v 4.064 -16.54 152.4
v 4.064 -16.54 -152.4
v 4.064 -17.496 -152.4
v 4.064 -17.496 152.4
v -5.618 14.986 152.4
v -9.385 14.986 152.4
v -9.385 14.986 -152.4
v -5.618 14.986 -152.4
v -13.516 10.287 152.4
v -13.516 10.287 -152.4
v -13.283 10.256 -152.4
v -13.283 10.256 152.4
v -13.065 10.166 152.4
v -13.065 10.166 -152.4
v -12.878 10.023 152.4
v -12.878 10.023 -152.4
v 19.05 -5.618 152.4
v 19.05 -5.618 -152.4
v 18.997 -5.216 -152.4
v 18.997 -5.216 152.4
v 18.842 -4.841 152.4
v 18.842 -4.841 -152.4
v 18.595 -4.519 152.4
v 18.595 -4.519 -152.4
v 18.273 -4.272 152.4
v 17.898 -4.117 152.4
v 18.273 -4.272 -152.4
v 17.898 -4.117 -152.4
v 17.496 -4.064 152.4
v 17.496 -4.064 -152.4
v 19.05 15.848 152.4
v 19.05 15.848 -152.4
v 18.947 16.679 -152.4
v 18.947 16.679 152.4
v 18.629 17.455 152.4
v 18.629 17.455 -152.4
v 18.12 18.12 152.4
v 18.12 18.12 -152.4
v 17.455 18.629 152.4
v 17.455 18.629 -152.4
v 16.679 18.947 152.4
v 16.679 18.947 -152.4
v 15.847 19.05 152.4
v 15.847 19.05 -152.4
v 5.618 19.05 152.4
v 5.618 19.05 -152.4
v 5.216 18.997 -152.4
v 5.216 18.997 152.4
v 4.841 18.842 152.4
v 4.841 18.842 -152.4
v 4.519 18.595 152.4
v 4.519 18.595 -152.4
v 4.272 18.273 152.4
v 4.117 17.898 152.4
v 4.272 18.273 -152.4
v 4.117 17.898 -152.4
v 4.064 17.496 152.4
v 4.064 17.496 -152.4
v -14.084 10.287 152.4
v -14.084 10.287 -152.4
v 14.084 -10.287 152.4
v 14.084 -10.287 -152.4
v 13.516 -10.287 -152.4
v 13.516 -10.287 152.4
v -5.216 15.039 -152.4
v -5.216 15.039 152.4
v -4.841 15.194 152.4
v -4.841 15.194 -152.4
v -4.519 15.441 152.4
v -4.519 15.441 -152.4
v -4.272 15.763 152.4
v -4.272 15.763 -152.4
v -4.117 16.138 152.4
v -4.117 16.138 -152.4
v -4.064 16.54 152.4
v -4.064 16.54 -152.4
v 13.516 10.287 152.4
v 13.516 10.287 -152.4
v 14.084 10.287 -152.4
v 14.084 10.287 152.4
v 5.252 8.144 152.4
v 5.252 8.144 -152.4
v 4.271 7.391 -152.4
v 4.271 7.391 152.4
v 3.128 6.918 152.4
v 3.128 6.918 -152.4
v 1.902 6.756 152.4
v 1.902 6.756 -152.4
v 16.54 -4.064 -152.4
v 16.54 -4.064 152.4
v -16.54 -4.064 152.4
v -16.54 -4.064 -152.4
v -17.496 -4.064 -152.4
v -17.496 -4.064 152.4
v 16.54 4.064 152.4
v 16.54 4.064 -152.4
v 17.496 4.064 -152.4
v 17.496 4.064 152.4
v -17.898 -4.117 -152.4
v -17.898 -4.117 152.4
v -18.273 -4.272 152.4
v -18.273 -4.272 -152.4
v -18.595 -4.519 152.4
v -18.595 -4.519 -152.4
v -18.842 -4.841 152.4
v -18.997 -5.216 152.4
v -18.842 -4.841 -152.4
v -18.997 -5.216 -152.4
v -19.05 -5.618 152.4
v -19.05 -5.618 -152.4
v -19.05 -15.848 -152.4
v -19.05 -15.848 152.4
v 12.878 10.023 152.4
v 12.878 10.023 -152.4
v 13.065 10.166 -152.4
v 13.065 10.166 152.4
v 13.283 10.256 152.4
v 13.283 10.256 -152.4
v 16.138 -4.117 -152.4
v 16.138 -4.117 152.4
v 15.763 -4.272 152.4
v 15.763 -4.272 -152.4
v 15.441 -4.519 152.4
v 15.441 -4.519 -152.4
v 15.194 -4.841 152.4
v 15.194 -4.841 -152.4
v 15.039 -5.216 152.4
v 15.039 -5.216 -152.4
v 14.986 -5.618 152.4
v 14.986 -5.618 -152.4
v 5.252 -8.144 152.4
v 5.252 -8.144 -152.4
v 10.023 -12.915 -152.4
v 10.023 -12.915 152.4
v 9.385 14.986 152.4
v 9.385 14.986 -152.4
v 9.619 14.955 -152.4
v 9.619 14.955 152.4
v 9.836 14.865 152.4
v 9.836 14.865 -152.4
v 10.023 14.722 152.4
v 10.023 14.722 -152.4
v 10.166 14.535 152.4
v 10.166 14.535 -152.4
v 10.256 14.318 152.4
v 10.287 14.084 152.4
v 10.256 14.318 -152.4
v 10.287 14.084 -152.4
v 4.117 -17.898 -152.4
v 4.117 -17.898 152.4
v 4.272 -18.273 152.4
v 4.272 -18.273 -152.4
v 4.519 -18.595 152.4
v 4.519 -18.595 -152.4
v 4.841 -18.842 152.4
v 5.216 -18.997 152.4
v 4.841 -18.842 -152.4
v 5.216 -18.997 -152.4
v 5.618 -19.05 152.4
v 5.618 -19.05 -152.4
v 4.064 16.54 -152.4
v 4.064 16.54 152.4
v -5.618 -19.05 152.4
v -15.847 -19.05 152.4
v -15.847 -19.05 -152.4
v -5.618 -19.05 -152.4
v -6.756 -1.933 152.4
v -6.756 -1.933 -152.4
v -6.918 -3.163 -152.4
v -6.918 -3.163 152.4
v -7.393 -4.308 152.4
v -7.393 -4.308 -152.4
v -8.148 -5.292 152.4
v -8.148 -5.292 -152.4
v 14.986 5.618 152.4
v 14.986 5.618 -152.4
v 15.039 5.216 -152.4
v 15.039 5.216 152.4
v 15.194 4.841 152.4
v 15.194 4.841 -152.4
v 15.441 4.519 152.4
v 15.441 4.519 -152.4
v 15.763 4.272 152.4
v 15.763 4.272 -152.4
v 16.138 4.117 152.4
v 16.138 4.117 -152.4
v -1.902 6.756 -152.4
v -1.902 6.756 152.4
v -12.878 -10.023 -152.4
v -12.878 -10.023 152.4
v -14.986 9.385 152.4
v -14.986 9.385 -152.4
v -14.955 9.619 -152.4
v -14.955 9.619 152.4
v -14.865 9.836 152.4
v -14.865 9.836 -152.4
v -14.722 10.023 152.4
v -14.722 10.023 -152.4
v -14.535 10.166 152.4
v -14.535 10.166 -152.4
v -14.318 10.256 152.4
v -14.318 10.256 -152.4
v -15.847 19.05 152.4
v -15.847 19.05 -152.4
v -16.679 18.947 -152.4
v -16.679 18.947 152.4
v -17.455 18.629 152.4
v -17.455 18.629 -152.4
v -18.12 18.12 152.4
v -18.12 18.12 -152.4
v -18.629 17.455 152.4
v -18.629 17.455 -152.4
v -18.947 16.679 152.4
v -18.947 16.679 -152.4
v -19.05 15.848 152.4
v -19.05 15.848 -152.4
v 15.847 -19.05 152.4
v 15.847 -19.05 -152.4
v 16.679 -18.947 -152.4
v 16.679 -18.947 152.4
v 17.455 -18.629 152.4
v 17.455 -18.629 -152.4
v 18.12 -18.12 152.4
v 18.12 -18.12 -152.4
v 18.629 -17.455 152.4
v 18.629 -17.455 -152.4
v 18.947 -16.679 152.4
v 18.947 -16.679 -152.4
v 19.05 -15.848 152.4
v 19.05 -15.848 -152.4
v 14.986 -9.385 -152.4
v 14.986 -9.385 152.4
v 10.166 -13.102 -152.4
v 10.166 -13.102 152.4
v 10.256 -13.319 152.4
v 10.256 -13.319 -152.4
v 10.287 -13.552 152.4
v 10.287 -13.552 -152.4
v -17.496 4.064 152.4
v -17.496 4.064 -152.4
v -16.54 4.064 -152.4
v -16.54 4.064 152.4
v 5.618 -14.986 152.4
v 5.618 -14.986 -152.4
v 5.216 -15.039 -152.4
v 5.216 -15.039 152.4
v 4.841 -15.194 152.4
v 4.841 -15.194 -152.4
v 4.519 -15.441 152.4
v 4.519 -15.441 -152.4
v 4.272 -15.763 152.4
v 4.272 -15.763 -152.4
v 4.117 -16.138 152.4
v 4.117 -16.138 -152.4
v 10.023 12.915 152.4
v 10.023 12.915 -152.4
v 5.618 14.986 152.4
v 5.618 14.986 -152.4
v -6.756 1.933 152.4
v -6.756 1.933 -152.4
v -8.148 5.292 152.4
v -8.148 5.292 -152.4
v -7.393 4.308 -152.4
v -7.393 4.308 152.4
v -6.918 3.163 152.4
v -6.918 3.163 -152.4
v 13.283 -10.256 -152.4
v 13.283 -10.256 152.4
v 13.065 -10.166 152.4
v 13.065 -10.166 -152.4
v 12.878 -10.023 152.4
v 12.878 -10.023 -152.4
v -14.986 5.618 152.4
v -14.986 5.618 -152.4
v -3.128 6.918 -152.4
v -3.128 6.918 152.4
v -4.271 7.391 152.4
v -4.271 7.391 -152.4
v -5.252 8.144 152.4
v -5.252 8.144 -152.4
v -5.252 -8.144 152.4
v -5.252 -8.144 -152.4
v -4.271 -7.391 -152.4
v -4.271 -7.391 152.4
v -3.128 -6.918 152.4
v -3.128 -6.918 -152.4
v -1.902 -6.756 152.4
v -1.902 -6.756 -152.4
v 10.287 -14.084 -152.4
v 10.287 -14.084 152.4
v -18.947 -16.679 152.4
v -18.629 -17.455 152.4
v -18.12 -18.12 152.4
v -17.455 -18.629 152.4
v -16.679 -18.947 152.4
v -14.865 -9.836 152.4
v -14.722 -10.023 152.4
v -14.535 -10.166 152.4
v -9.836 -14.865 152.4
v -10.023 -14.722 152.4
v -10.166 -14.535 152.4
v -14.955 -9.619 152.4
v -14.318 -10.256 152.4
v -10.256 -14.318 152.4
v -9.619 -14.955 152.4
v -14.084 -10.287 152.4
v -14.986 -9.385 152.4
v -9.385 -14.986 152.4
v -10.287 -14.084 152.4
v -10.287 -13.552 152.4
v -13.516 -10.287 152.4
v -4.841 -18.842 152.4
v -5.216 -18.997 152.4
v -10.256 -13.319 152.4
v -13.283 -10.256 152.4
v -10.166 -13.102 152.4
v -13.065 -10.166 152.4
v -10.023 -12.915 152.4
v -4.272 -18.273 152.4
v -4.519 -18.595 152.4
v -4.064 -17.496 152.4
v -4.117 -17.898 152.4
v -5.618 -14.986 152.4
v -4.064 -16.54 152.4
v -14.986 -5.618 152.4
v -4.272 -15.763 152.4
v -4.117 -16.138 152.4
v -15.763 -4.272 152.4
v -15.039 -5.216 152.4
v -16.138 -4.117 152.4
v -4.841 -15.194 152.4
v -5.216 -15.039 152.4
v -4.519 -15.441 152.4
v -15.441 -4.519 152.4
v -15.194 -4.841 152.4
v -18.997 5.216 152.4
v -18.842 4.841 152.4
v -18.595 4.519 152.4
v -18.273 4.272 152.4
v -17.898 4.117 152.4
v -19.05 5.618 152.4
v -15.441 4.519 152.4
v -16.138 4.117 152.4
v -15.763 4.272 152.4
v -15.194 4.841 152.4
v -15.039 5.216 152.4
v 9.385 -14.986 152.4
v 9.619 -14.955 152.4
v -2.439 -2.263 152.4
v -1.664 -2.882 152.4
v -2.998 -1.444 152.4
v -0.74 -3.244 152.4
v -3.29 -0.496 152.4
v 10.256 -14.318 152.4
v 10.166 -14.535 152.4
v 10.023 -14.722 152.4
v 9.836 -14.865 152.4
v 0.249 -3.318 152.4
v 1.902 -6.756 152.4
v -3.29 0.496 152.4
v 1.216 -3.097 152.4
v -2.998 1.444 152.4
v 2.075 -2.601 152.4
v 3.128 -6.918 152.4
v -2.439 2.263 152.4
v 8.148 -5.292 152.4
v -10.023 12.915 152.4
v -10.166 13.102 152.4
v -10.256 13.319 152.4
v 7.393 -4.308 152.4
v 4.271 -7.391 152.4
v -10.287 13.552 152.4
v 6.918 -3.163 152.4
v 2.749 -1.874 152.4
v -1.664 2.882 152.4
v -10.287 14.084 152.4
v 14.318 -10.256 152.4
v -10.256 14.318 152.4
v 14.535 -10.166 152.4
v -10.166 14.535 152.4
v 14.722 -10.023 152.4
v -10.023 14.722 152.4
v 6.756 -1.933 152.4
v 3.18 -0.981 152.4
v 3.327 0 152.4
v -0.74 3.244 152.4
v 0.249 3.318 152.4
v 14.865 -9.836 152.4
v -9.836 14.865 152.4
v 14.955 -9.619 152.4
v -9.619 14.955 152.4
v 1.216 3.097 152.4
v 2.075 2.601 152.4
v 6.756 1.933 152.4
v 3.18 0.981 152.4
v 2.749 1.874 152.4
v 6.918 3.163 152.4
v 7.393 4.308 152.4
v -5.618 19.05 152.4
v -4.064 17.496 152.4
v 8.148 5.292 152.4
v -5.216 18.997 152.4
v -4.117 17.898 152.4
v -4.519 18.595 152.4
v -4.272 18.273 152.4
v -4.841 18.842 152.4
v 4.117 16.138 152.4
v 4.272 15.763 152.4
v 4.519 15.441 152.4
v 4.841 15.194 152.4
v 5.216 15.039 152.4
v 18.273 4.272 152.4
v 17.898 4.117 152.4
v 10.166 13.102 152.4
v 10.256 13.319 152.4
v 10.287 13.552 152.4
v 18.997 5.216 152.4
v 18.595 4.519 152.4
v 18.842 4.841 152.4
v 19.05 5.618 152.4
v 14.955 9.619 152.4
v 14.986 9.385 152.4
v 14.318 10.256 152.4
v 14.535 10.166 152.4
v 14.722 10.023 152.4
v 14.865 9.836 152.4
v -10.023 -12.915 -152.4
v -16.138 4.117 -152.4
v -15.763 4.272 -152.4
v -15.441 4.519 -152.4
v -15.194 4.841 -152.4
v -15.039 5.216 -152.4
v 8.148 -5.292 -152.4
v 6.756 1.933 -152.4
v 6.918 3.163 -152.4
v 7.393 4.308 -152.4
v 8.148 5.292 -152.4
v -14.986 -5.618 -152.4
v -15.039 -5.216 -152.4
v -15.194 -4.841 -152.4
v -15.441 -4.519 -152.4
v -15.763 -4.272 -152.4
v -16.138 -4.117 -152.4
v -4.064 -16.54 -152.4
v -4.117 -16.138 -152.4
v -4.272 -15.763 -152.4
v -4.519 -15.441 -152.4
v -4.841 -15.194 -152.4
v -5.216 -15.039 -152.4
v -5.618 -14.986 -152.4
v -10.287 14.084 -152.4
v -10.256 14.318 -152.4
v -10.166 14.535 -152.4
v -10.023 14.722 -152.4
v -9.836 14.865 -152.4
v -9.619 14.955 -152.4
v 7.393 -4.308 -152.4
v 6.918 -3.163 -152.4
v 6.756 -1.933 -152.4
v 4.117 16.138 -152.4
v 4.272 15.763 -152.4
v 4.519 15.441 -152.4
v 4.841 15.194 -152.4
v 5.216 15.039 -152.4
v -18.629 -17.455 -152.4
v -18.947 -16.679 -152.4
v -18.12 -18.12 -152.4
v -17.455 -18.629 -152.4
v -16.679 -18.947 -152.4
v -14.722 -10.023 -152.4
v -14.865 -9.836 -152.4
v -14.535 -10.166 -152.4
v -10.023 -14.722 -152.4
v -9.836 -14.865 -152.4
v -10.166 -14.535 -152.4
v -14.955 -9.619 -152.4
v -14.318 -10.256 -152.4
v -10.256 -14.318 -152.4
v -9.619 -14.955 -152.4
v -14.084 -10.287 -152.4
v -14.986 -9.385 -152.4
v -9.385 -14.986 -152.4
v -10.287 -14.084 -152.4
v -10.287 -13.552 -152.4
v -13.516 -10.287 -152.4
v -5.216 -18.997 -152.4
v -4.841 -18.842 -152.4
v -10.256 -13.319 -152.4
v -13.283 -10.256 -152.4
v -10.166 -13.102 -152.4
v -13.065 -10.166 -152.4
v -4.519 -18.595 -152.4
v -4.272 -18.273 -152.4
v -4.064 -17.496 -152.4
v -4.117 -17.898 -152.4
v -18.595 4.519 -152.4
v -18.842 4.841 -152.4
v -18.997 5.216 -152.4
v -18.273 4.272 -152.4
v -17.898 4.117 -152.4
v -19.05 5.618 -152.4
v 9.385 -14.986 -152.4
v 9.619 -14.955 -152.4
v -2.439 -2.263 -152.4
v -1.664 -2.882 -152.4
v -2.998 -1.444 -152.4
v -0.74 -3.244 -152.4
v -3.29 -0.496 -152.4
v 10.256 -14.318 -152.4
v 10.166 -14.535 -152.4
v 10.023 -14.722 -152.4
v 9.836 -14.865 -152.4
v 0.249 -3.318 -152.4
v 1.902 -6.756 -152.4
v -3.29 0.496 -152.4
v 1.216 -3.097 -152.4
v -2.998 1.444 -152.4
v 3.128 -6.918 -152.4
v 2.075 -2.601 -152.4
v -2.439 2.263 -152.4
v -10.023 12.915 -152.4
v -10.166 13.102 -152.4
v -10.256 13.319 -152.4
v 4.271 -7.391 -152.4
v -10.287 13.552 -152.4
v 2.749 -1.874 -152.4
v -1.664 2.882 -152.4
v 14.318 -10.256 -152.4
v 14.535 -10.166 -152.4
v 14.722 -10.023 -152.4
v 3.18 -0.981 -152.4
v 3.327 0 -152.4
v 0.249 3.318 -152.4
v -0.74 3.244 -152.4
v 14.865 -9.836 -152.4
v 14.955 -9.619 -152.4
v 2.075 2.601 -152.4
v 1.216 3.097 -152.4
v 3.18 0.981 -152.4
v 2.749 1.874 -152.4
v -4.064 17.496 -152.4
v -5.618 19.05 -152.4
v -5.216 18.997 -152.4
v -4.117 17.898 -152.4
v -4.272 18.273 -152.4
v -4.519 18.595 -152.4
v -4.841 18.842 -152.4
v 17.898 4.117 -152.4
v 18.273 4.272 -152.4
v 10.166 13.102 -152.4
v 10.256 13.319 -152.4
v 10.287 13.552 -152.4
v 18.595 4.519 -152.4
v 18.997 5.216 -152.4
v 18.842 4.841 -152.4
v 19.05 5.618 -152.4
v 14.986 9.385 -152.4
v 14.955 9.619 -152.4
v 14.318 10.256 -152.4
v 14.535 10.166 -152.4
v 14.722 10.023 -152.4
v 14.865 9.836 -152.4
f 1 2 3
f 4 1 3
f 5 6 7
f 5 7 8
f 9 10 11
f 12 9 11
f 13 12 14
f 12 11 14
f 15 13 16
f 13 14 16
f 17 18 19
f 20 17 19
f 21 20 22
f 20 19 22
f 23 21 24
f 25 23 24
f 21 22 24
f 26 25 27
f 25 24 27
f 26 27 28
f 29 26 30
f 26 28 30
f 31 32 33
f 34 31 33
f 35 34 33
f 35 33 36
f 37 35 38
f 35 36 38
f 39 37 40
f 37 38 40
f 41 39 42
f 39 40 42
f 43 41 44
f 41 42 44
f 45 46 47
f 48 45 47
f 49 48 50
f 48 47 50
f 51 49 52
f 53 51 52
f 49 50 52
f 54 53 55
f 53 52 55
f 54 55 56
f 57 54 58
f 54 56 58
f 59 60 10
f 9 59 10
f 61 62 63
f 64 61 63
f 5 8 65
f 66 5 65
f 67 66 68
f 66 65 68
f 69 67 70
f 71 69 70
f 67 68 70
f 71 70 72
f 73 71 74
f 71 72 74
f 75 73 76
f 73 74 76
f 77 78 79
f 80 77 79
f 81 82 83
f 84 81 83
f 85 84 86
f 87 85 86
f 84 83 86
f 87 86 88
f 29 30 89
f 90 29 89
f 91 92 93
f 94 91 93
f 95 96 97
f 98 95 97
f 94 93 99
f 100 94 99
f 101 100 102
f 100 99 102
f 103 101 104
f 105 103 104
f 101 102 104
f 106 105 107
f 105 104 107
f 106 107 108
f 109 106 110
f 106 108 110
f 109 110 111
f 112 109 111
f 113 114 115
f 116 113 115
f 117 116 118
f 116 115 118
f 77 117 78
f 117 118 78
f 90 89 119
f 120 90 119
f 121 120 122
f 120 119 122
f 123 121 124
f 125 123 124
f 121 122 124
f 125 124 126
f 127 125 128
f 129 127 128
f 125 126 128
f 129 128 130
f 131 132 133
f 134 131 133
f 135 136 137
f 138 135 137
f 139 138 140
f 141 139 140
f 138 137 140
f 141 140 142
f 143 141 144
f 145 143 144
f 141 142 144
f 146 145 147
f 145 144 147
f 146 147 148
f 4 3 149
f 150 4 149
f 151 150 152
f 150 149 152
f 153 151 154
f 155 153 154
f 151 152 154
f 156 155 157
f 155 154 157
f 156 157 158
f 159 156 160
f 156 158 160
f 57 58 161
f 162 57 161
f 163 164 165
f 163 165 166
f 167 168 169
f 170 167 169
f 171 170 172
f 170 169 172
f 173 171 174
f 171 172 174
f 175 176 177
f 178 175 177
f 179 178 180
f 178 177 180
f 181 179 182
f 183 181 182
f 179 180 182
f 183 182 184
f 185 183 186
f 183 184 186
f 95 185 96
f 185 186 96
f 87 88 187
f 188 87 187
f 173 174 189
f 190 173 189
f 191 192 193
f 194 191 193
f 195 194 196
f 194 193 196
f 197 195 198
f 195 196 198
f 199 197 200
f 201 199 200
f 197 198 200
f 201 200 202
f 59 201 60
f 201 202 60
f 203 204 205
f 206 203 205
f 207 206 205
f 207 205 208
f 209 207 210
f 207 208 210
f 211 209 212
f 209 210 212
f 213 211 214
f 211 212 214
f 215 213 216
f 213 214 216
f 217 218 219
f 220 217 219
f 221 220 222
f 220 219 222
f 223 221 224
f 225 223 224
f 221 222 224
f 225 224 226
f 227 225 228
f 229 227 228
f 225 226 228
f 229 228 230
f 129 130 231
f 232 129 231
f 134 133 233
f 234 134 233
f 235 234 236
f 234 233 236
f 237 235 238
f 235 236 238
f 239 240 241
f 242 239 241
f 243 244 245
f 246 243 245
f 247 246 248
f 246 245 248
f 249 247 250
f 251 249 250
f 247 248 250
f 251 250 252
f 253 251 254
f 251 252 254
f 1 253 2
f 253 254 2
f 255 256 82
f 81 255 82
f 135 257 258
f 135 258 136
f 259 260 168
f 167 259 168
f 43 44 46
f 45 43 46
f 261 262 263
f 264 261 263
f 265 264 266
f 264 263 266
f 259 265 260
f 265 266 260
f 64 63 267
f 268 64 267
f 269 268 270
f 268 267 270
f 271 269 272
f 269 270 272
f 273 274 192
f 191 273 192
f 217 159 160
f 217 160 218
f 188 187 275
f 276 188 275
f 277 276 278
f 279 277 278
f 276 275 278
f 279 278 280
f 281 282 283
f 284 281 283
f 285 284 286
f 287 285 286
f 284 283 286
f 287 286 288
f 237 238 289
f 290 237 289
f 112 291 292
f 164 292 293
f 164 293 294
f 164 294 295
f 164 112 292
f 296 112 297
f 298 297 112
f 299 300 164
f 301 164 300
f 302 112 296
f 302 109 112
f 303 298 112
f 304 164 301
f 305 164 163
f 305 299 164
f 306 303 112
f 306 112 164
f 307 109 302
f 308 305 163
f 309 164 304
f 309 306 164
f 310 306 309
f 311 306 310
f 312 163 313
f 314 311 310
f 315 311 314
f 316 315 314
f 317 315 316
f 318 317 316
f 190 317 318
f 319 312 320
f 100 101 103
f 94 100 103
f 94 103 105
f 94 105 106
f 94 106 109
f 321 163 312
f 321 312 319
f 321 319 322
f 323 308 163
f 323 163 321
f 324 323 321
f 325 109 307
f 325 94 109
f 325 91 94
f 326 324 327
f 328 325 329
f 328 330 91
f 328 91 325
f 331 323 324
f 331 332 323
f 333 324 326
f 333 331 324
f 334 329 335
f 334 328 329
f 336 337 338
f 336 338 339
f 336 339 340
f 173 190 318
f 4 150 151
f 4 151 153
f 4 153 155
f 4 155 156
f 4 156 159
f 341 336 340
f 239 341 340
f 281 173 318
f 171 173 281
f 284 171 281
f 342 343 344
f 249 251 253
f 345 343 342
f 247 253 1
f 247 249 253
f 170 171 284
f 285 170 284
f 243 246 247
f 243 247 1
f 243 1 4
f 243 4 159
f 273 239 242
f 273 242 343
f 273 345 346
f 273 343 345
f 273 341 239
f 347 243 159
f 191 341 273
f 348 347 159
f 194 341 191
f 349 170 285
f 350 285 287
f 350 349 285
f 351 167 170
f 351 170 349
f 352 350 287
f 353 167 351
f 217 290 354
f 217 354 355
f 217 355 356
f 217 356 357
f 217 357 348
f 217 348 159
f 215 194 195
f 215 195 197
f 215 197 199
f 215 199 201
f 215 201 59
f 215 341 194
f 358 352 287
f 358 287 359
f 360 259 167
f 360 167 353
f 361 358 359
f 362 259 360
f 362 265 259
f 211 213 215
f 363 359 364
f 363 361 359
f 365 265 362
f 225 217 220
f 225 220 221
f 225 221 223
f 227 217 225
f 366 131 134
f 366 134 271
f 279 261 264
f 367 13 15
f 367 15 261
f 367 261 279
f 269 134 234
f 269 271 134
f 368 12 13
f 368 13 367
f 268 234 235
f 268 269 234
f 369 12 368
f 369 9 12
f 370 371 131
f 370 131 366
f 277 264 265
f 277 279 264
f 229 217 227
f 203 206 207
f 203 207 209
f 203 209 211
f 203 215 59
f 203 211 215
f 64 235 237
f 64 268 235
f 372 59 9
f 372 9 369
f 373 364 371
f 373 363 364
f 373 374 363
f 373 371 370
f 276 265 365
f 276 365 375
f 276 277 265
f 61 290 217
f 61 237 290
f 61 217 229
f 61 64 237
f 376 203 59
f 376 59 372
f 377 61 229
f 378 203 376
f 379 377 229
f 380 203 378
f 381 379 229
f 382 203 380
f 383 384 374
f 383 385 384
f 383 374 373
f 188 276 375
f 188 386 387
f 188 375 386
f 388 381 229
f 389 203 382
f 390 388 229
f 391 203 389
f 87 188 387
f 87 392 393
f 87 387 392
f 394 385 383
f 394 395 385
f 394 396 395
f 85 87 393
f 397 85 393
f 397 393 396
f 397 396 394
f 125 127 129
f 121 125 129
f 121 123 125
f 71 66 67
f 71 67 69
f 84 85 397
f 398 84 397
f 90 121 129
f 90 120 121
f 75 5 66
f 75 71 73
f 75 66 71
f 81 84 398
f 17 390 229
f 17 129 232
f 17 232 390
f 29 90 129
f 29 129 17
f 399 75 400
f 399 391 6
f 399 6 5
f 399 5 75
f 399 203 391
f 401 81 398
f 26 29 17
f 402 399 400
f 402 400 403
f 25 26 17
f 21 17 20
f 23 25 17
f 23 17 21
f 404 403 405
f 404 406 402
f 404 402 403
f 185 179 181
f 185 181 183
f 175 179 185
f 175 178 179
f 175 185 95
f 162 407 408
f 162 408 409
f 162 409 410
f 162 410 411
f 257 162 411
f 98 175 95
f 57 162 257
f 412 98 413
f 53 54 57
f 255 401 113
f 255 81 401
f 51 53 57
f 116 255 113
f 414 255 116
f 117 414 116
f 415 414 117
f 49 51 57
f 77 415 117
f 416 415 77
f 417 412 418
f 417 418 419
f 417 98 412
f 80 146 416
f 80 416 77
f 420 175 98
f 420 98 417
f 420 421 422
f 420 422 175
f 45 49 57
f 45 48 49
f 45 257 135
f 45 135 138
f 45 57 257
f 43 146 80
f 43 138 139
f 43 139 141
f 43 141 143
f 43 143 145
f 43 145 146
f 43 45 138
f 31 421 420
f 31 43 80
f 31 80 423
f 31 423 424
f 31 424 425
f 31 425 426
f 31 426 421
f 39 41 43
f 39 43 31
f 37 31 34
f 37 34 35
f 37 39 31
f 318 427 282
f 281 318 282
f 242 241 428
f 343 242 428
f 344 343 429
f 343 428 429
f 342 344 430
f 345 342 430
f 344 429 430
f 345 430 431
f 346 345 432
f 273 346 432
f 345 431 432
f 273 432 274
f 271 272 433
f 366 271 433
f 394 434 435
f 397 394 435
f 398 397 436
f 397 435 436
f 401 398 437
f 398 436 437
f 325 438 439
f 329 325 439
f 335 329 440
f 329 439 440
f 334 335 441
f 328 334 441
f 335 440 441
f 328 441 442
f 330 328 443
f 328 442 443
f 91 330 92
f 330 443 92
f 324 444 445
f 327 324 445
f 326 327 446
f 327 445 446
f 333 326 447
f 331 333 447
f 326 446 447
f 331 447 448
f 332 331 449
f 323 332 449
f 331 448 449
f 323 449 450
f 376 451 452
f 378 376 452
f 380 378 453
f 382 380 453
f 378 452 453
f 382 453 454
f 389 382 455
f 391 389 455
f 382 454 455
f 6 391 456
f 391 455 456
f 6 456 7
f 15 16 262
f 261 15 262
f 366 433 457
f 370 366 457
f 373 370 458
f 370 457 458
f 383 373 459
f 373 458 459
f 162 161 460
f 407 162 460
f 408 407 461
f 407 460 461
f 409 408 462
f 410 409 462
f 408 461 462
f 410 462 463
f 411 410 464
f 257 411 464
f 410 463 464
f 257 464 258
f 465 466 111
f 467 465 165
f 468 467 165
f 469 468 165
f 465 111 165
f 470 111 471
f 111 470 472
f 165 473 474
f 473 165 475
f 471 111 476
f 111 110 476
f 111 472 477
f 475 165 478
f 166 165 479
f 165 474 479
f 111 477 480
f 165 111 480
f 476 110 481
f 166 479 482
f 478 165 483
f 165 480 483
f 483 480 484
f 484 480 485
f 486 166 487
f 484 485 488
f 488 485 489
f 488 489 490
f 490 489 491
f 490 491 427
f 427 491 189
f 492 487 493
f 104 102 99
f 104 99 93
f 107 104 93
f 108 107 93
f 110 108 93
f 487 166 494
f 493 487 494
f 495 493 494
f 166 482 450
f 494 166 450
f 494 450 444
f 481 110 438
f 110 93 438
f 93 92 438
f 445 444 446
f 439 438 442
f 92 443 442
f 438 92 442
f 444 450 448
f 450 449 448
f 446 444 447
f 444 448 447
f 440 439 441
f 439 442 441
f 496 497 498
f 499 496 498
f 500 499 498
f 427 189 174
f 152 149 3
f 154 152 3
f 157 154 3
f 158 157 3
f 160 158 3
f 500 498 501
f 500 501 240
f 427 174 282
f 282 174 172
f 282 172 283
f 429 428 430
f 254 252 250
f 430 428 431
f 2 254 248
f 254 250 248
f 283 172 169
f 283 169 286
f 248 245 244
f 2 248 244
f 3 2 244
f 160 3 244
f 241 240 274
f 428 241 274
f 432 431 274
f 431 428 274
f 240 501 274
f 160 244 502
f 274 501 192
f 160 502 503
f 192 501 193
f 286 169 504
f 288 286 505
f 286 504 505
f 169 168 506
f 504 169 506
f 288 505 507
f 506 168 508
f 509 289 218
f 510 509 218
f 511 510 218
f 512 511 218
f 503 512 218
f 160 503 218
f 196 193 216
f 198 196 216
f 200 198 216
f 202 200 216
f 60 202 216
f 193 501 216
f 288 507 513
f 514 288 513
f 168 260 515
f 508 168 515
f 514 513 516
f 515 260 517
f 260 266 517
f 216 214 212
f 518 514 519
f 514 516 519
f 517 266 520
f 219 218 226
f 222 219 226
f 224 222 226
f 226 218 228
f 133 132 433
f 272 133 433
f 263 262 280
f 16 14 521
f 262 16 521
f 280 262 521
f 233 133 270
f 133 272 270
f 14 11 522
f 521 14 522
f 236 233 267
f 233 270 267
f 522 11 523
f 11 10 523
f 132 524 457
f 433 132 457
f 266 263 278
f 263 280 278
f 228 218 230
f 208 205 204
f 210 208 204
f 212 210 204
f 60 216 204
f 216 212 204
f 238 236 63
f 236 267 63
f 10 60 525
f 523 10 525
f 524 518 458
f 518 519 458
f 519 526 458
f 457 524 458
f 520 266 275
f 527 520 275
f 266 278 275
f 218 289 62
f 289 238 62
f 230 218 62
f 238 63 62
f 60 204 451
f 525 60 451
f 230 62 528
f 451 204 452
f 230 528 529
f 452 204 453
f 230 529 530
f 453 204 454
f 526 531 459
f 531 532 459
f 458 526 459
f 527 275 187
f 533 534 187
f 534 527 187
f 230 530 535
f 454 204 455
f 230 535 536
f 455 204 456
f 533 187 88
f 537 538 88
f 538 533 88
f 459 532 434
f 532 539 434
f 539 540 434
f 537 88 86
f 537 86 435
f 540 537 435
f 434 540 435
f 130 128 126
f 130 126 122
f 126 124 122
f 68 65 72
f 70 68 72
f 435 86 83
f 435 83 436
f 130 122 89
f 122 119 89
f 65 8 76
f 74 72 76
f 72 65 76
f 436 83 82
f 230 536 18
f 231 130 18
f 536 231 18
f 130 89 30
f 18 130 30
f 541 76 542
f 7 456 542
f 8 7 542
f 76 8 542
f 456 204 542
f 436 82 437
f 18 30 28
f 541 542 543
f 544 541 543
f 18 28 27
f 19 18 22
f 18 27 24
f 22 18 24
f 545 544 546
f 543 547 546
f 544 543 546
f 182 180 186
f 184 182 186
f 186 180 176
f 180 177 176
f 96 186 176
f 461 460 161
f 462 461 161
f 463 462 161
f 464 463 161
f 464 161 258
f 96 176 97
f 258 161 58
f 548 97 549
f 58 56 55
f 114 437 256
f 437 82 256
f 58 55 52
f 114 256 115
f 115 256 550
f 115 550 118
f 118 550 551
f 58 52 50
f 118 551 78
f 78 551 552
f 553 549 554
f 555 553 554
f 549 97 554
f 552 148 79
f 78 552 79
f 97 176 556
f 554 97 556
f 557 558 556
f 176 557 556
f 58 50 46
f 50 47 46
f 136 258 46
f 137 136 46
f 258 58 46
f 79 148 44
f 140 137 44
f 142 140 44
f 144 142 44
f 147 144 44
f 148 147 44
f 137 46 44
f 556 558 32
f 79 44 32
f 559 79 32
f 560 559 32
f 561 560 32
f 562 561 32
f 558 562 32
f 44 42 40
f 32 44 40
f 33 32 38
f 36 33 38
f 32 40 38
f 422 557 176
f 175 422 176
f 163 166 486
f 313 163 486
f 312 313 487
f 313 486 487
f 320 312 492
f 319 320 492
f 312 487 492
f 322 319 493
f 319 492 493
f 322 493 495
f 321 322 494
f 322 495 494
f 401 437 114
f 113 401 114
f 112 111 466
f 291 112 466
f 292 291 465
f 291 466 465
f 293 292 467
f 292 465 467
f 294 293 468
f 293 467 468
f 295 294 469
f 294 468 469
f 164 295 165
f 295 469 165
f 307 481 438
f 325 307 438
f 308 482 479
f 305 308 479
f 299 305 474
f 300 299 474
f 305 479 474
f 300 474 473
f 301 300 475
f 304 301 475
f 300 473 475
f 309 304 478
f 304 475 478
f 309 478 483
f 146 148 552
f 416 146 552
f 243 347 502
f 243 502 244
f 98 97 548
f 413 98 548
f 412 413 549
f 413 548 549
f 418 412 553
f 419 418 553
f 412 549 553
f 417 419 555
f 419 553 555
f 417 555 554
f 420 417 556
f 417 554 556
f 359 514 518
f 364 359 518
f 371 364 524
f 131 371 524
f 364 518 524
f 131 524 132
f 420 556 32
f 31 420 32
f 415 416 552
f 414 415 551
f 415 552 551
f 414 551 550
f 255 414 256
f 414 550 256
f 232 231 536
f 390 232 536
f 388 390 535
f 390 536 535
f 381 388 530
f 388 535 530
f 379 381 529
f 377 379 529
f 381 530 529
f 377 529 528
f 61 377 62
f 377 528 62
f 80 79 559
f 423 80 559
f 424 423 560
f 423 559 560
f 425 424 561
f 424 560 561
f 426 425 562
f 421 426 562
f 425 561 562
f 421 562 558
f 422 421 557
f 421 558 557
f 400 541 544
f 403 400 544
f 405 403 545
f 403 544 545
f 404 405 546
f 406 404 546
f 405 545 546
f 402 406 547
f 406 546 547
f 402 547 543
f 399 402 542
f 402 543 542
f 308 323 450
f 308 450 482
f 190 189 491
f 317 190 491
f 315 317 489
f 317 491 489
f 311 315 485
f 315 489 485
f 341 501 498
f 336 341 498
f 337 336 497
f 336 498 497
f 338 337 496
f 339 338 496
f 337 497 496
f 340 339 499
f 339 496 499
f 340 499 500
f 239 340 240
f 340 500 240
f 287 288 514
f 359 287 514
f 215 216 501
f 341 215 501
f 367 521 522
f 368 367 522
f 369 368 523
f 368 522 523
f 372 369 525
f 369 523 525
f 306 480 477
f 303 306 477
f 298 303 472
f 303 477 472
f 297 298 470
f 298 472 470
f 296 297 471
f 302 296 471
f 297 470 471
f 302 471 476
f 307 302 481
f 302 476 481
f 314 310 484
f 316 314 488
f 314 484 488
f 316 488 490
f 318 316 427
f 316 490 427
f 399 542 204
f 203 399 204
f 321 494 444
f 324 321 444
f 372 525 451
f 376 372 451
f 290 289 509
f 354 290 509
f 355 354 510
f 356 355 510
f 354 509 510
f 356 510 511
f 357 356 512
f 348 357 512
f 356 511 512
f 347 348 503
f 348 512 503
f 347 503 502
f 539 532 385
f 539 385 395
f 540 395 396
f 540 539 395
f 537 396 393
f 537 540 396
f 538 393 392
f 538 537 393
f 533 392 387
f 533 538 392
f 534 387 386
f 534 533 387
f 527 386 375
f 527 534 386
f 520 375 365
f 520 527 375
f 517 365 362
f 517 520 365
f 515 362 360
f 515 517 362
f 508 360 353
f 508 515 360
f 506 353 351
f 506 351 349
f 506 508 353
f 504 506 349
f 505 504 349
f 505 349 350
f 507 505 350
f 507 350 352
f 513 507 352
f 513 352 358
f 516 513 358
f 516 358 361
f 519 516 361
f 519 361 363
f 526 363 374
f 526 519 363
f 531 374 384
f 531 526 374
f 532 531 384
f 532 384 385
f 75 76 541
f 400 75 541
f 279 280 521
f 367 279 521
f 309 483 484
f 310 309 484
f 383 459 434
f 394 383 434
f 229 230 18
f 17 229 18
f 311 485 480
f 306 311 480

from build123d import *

# Parameters (mm, degrees)
BOSS_EXTRUDE1_DEPTH      = 152.4
BOSS_EXTRUDE1_DEPTH_BACK = 152.4
SKETCH3_R                = 3.3274


with BuildPart() as part:
    # Sketch3 → Boss-Extrude1 (new, two sides: drawn at the far end of the back side and taken through both)
    with BuildSketch(Plane.XY.offset(-BOSS_EXTRUDE1_DEPTH_BACK)):
        with BuildLine():
            ThreePointArc((-5.617617549, 14.986), (-4.519044045, 15.441044045), (-4.064, 16.539617549))
            Line((-4.064, 16.539617549), (-4.064, 17.496382451))
            ThreePointArc((-4.064, 17.496382451), (-4.519044045, 18.594955955), (-5.617617549, 19.05))
            Line((-5.617617549, 19.05), (-7.974178704, 19.05))
            Line((-7.974178704, 19.05), (-9.498178704, 19.05))
            Line((-9.498178704, 19.05), (-14.327719207, 19.05))
            Line((-14.327719207, 19.05), (-15.847487039, 19.05))
            ThreePointArc((-15.847487039, 19.05), (-18.120176289, 18.120192083), (-19.05, 15.847509295))
            Line((-19.05, 15.847509295), (-19.05, 14.327741484))
            Line((-19.05, 14.327741484), (-19.05, 9.496091471))
            Line((-19.05, 9.496091471), (-19.05, 7.97632366))
            Line((-19.05, 7.97632366), (-19.05, 5.617617549))
            ThreePointArc((-19.05, 5.617617549), (-18.594955955, 4.519044045), (-17.496382451, 4.064))
            Line((-17.496382451, 4.064), (-16.539617549, 4.064))
            ThreePointArc((-16.539617549, 4.064), (-15.441044045, 4.519044045), (-14.986, 5.617617549))
            Line((-14.986, 5.617617549), (-14.986, 9.385342516))
            ThreePointArc((-14.986, 9.385342516), (-14.721898185, 10.022940701), (-14.0843, 10.287042516))
            Line((-14.0843, 10.287042516), (-13.516042086, 10.287042516))
            ThreePointArc((-13.516042086, 10.287042516), (-13.170975923, 10.218404478), (-12.878443117, 10.022939917))
            Line((-12.878443117, 10.022939917), (-8.14758008, 5.292065243))
            ThreePointArc((-8.14758008, 5.292065243), (-7.117955879, 3.751120653), (-6.7564, 1.933453584))
            Line((-6.7564, 1.933453584), (-6.7564, -1.933453584))
            ThreePointArc((-6.7564, -1.933453584), (-7.117955879, -3.751120653), (-8.14758008, -5.292065243))
            Line((-8.14758008, -5.292065243), (-12.878443117, -10.022939917))
            ThreePointArc((-12.878443117, -10.022939917), (-13.170975923, -10.218404478), (-13.516042086, -10.287042516))
            Line((-13.516042086, -10.287042516), (-14.0843, -10.287042516))
            ThreePointArc((-14.0843, -10.287042516), (-14.721898185, -10.022940701), (-14.986, -9.385342516))
            Line((-14.986, -9.385342516), (-14.986, -5.617617549))
            ThreePointArc((-14.986, -5.617617549), (-15.441044045, -4.519044045), (-16.539617549, -4.064))
            Line((-16.539617549, -4.064), (-17.496382451, -4.064))
            ThreePointArc((-17.496382451, -4.064), (-18.594955955, -4.519044045), (-19.05, -5.617617549))
            Line((-19.05, -5.617617549), (-19.05, -7.976318491))
            Line((-19.05, -7.976318491), (-19.05, -9.496086302))
            Line((-19.05, -9.496086302), (-19.05, -14.32774291))
            Line((-19.05, -14.32774291), (-19.05, -15.847510721))
            ThreePointArc((-19.05, -15.847510721), (-18.120175716, -18.120192644), (-15.847486868, -19.05))
            Line((-15.847486868, -19.05), (-14.327719036, -19.05))
            Line((-14.327719036, -19.05), (-9.496062448, -19.05))
            Line((-9.496062448, -19.05), (-7.976294616, -19.05))
            Line((-7.976294616, -19.05), (-5.617617549, -19.05))
            ThreePointArc((-5.617617549, -19.05), (-4.519044045, -18.594955955), (-4.064, -17.496382451))
            Line((-4.064, -17.496382451), (-4.064, -16.539617549))
            ThreePointArc((-4.064, -16.539617549), (-4.519044045, -15.441044045), (-5.617617549, -14.986))
            Line((-5.617617549, -14.986), (-9.3853, -14.986))
            ThreePointArc((-9.3853, -14.986), (-10.022898185, -14.721898185), (-10.287, -14.0843))
            Line((-10.287, -14.0843), (-10.287, -13.552357131))
            ThreePointArc((-10.287, -13.552357131), (-10.218362387, -13.207291992), (-10.022898969, -12.91475973))
            Line((-10.022898969, -12.91475973), (-5.252158105, -8.144007132))
            ThreePointArc((-5.252158105, -8.144007132), (-3.715177372, -7.117027388), (-1.902183975, -6.7564))
            Line((-1.902183975, -6.7564), (1.902183975, -6.7564))
            ThreePointArc((1.902183975, -6.7564), (3.715177372, -7.117027388), (5.252158105, -8.144007132))
            Line((5.252158105, -8.144007132), (10.022898969, -12.91475973))
            ThreePointArc((10.022898969, -12.91475973), (10.218362387, -13.207291992), (10.287, -13.552357131))
            Line((10.287, -13.552357131), (10.287, -14.0843))
            ThreePointArc((10.287, -14.0843), (10.022898185, -14.721898185), (9.3853, -14.986))
            Line((9.3853, -14.986), (5.617617549, -14.986))
            ThreePointArc((5.617617549, -14.986), (4.519044045, -15.441044045), (4.064, -16.539617549))
            Line((4.064, -16.539617549), (4.064, -17.496382451))
            ThreePointArc((4.064, -17.496382451), (4.519044045, -18.594955955), (5.617617549, -19.05))
            Line((5.617617549, -19.05), (7.976294616, -19.05))
            Line((7.976294616, -19.05), (9.496062448, -19.05))
            Line((9.496062448, -19.05), (14.327719036, -19.05))
            Line((14.327719036, -19.05), (15.847486868, -19.05))
            ThreePointArc((15.847486868, -19.05), (18.120175716, -18.120192644), (19.05, -15.847510721))
            Line((19.05, -15.847510721), (19.05, -14.32774291))
            Line((19.05, -14.32774291), (19.05, -9.496086302))
            Line((19.05, -9.496086302), (19.05, -7.976318491))
            Line((19.05, -7.976318491), (19.05, -5.617617549))
            ThreePointArc((19.05, -5.617617549), (18.594955955, -4.519044045), (17.496382451, -4.064))
            Line((17.496382451, -4.064), (16.539617549, -4.064))
            ThreePointArc((16.539617549, -4.064), (15.441044045, -4.519044045), (14.986, -5.617617549))
            Line((14.986, -5.617617549), (14.986, -9.385342516))
            ThreePointArc((14.986, -9.385342516), (14.721898185, -10.022940701), (14.0843, -10.287042516))
            Line((14.0843, -10.287042516), (13.516042086, -10.287042516))
            ThreePointArc((13.516042086, -10.287042516), (13.170975923, -10.218404478), (12.878443117, -10.022939917))
            Line((12.878443117, -10.022939917), (8.14758008, -5.292065243))
            ThreePointArc((8.14758008, -5.292065243), (7.117955879, -3.751120653), (6.7564, -1.933453584))
            Line((6.7564, -1.933453584), (6.7564, 1.933453584))
            ThreePointArc((6.7564, 1.933453584), (7.117955879, 3.751120653), (8.14758008, 5.292065243))
            Line((8.14758008, 5.292065243), (12.878443117, 10.022939917))
            ThreePointArc((12.878443117, 10.022939917), (13.170975923, 10.218404478), (13.516042086, 10.287042516))
            Line((13.516042086, 10.287042516), (14.0843, 10.287042516))
            ThreePointArc((14.0843, 10.287042516), (14.721898185, 10.022940701), (14.986, 9.385342516))
            Line((14.986, 9.385342516), (14.986, 5.617617549))
            ThreePointArc((14.986, 5.617617549), (15.441044045, 4.519044045), (16.539617549, 4.064))
            Line((16.539617549, 4.064), (17.496382451, 4.064))
            ThreePointArc((17.496382451, 4.064), (18.594955955, 4.519044045), (19.05, 5.617617549))
            Line((19.05, 5.617617549), (19.05, 7.97632366))
            Line((19.05, 7.97632366), (19.05, 9.496091471))
            Line((19.05, 9.496091471), (19.05, 14.327741484))
            Line((19.05, 14.327741484), (19.05, 15.847509295))
            ThreePointArc((19.05, 15.847509295), (18.120176289, 18.120192083), (15.847487039, 19.05))
            Line((15.847487039, 19.05), (14.327719207, 19.05))
            Line((14.327719207, 19.05), (9.498178704, 19.05))
            Line((9.498178704, 19.05), (7.974178704, 19.05))
            Line((7.974178704, 19.05), (5.617617549, 19.05))
            ThreePointArc((5.617617549, 19.05), (4.519044045, 18.594955955), (4.064, 17.496382451))
            Line((4.064, 17.496382451), (4.064, 16.539617549))
            ThreePointArc((4.064, 16.539617549), (4.519044045, 15.441044045), (5.617617549, 14.986))
            Line((5.617617549, 14.986), (9.3853, 14.986))
            ThreePointArc((9.3853, 14.986), (10.022898185, 14.721898185), (10.287, 14.0843))
            Line((10.287, 14.0843), (10.287, 13.552357131))
            ThreePointArc((10.287, 13.552357131), (10.218362387, 13.207291992), (10.022898969, 12.91475973))
            Line((10.022898969, 12.91475973), (5.252158105, 8.144007132))
            ThreePointArc((5.252158105, 8.144007132), (3.715177372, 7.117027388), (1.902183975, 6.7564))
            Line((1.902183975, 6.7564), (-1.902183975, 6.7564))
            ThreePointArc((-1.902183975, 6.7564), (-3.715177372, 7.117027388), (-5.252158105, 8.144007132))
            Line((-5.252158105, 8.144007132), (-10.022898969, 12.91475973))
            ThreePointArc((-10.022898969, 12.91475973), (-10.218362387, 13.207291992), (-10.287, 13.552357131))
            Line((-10.287, 13.552357131), (-10.287, 14.0843))
            ThreePointArc((-10.287, 14.0843), (-10.022898185, 14.721898185), (-9.3853, 14.986))
            Line((-9.3853, 14.986), (-5.617617549, 14.986))
        make_face()
        Circle(SKETCH3_R, mode=Mode.SUBTRACT)
    extrude(amount=BOSS_EXTRUDE1_DEPTH + BOSS_EXTRUDE1_DEPTH_BACK)


solid = part.part
